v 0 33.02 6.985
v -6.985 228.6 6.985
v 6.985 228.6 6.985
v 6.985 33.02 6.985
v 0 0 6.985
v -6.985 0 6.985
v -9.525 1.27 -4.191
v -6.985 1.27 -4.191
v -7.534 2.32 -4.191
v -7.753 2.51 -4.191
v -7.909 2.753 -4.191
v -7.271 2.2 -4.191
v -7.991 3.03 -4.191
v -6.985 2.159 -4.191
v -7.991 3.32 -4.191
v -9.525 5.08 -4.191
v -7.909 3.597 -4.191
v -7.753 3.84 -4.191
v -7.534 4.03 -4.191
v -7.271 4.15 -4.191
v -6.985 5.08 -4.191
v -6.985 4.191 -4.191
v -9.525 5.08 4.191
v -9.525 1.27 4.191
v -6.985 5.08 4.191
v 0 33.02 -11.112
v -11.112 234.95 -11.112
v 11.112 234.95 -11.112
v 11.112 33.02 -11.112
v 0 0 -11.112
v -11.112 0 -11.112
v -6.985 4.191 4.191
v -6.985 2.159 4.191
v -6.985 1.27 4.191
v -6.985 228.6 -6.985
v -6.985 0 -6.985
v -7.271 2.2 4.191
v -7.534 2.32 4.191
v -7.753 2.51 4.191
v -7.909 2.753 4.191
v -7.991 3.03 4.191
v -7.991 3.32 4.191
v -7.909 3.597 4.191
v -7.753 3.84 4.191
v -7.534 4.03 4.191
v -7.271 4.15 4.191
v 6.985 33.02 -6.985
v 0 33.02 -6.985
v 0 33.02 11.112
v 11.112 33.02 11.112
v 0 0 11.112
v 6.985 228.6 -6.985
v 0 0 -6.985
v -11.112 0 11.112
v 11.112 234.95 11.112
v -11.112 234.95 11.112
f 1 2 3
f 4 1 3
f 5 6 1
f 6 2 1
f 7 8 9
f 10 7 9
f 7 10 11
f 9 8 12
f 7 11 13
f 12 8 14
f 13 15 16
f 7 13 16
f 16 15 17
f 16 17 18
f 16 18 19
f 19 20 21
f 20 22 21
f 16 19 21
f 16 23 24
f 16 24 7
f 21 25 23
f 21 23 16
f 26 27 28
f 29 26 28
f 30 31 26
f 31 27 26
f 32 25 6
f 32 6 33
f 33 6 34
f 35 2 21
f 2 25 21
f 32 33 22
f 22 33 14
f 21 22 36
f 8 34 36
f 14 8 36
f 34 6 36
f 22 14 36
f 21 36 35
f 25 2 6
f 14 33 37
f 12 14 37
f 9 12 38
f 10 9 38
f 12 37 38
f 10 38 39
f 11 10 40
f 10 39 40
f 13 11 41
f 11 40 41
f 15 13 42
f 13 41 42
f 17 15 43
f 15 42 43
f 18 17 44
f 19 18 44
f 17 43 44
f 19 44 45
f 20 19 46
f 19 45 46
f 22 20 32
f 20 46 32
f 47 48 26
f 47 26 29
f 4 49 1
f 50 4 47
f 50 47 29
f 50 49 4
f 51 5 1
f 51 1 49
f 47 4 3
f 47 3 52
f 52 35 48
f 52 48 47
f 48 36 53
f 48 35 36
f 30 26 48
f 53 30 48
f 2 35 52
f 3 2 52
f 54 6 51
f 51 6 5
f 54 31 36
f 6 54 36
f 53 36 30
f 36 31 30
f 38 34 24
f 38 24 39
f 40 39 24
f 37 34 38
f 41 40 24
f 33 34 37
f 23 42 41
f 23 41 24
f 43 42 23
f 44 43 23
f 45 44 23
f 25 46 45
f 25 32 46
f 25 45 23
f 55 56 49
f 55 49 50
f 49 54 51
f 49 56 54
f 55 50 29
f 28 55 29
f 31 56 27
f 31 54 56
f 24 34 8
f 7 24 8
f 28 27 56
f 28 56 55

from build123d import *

# Parameters (mm, degrees)
SKETCH2_W           = 22.225
SKETCH2_H           = 22.225
SKETCH2_W_2         = 13.97
SKETCH2_H_2         = 13.97
BOSS_EXTRUDE1_DEPTH = 6.35
SKETCH3_W           = 8.382
SKETCH3_H           = 3.81
CUT_EXTRUDE1_DEPTH  = 2.54
BOSS_EXTRUDE2_DEPTH = 8.382
SKETCH6_W           = 22.225
SKETCH6_H           = 22.225
SKETCH6_W_2         = 13.97
SKETCH6_H_2         = 13.97
BOSS_EXTRUDE3_DEPTH = 222.25
SKETCH7_W           = 22.225
SKETCH7_H           = 22.225
BOSS_EXTRUDE4_DEPTH = 6.35
SKETCH8_W           = 11.1125
SKETCH8_H           = 22.225
CUT_EXTRUDE2_DEPTH  = 33.02


with BuildPart() as part:
    # Sketch2 → Boss-Extrude1 (new body)
    with BuildSketch(Plane(origin=(0, 0, 0), x_dir=(1, 0, 0), z_dir=(0, 1, 0))):
        Rectangle(SKETCH2_W, SKETCH2_H)
        Rectangle(SKETCH2_W_2, SKETCH2_H_2, mode=Mode.SUBTRACT)
    extrude(amount=BOSS_EXTRUDE1_DEPTH)

    # Sketch3 → Cut-Extrude1 (cut)
    with BuildSketch(Plane(origin=(-6.985, 0, 0), x_dir=(0, 0, -1), z_dir=(1, 0, 0))):
        with Locations((0, 3.175)):
            Rectangle(SKETCH3_W, SKETCH3_H)
    extrude(amount=-CUT_EXTRUDE1_DEPTH, mode=Mode.SUBTRACT)

    # Sketch4 → Boss-Extrude2 (add)
    with BuildSketch(Plane(origin=(0, 0, 4.191), x_dir=(-1, 0, 0), z_dir=(0, 0, -1))):
        with BuildLine():
            Line((6.985, 4.191), (6.985, 2.159))
            ThreePointArc((6.985, 2.159), (8.001, 3.175), (6.985, 4.191))
        make_face()
    extrude(amount=BOSS_EXTRUDE2_DEPTH)

    # Sketch6 → Boss-Extrude3 (add)
    with BuildSketch(Plane(origin=(0, 6.35, 0), x_dir=(1, 0, 0), z_dir=(0, 1, 0))):
        Rectangle(SKETCH6_W, SKETCH6_H)
        Rectangle(SKETCH6_W_2, SKETCH6_H_2, mode=Mode.SUBTRACT)
    extrude(amount=BOSS_EXTRUDE3_DEPTH)

    # Sketch7 → Boss-Extrude4 (add)
    with BuildSketch(Plane(origin=(0, 228.6, 0), x_dir=(1, 0, 0), z_dir=(0, 1, 0))):
        Rectangle(SKETCH7_W, SKETCH7_H)
    extrude(amount=BOSS_EXTRUDE4_DEPTH)

    # Sketch8 → Cut-Extrude2 (cut)
    with BuildSketch(Plane.XZ):
        with Locations((5.55625, 0)):
            Rectangle(SKETCH8_W, SKETCH8_H)
    extrude(amount=-CUT_EXTRUDE2_DEPTH, mode=Mode.SUBTRACT)


solid = part.part
